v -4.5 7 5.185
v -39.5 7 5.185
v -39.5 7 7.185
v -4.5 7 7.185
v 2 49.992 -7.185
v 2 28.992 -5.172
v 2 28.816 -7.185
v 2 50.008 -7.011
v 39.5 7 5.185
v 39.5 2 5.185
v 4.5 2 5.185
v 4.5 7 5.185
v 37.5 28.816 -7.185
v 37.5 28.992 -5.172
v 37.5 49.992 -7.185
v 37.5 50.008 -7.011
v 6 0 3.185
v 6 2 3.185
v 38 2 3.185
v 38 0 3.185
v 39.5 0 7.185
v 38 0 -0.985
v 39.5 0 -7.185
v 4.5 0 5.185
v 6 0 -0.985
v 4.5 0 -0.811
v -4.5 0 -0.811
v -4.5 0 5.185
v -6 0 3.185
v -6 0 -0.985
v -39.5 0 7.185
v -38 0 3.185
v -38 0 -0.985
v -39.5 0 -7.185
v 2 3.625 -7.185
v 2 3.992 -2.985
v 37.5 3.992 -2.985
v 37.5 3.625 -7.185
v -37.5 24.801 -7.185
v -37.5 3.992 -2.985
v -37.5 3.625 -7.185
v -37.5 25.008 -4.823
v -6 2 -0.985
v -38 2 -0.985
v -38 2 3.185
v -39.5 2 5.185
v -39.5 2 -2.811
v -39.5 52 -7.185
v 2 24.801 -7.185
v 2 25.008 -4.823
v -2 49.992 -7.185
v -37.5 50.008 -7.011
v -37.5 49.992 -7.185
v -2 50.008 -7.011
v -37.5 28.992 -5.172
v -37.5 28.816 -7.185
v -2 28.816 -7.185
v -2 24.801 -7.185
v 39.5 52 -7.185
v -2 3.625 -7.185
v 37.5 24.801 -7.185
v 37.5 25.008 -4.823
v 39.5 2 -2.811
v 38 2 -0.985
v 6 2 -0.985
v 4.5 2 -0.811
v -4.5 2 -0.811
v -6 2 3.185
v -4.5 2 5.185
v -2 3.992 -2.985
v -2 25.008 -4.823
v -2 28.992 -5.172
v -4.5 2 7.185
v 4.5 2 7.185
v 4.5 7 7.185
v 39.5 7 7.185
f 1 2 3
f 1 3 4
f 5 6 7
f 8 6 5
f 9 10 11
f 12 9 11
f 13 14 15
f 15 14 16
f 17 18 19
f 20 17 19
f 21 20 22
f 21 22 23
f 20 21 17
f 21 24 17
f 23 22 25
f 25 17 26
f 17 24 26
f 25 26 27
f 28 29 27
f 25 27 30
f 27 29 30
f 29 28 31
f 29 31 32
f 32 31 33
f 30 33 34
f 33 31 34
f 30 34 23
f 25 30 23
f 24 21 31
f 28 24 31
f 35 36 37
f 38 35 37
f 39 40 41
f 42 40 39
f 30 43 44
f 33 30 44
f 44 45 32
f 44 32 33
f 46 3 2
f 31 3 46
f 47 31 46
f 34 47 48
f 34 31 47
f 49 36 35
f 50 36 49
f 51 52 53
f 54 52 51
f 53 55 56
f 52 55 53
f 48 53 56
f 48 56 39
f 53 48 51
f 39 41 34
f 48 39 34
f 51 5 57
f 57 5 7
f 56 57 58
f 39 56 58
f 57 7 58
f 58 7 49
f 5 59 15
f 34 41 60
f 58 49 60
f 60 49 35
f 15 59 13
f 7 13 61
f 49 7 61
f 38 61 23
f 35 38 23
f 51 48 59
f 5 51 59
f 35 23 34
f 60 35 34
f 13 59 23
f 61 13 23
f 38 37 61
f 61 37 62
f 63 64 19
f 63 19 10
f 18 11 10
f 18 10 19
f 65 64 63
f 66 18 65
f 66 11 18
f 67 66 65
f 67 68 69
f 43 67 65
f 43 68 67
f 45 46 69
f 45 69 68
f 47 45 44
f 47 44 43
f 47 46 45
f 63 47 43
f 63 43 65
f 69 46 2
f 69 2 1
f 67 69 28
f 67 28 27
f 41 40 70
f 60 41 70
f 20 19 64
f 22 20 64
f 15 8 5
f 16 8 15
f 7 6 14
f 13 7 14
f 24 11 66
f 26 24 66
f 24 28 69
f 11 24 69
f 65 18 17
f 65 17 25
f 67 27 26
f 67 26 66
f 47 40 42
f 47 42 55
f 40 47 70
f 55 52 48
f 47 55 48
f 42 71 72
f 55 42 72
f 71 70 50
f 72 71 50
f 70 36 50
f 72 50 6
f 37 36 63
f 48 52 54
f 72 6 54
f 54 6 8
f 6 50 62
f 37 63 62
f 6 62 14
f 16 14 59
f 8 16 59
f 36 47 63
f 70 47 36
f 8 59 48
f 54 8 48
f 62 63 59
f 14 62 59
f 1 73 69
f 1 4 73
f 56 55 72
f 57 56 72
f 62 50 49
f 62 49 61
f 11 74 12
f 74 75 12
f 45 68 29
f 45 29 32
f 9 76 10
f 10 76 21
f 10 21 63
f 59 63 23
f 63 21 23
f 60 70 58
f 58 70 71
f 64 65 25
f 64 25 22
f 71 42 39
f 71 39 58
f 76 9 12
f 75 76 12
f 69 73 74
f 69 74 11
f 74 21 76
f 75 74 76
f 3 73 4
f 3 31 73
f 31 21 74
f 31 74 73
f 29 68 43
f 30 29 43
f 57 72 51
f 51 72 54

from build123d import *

# Parameters (mm, degrees)
CROQUIS1_W              = 79
CROQUIS1_H              = 14.37
SALIENTE_EXTRUIR1_DEPTH = 2
SALIENTE_EXTRUIR2_DEPTH = 79
CROQUIS4_W              = 35
CROQUIS4_H              = 2
SALIENTE_EXTRUIR3_DEPTH = 5
CORTAR_EXTRUIR1_REACH   = 66.124
CROQUIS5_W              = 9
CROQUIS5_H              = 9.995566824
CORTAR_EXTRUIR2_REACH   = 68.213
CROQUIS6_W              = 35.5
CROQUIS6_H              = 21.095495938
CROQUIS6_H_2            = 21.095495939
CORTAR_EXTRUIR3_REACH   = 66.124
CROQUIS7_W              = 32
CROQUIS7_H              = 4.169878309
SALIENTE_EXTRUIR4_REACH = 70.495
CROQUIS8_W              = 2
CROQUIS8_H              = 2
SALIENTE_EXTRUIR5_REACH = 70.495
CROQUIS11_W             = 2
CROQUIS11_H             = 2


with BuildPart() as part:
    # Croquis1 → Saliente-Extruir1 (new body)
    with BuildSketch(Plane(origin=(0, 0, 0), x_dir=(1, 0, 0), z_dir=(0, 1, 0))):
        Rectangle(CROQUIS1_W, CROQUIS1_H)
    extrude(amount=SALIENTE_EXTRUIR1_DEPTH)

    # Croquis2 → Saliente-Extruir2 (add)
    with BuildSketch(Plane(origin=(39.5, 0, 0), x_dir=(0, 0, -1), z_dir=(1, 0, 0))):
        Polygon((2.810566824, 2), (7.185, 52), (7.185, 2), align=None)
    extrude(amount=-SALIENTE_EXTRUIR2_DEPTH)

    # Croquis4 → Saliente-Extruir3 (add)
    with BuildSketch(Plane(origin=(0, 2, 0), x_dir=(1, 0, 0), z_dir=(0, 1, 0))):
        with Locations((-22, -6.185)):
            Rectangle(CROQUIS4_W, CROQUIS4_H)
    saliente_extruir3 = extrude(amount=SALIENTE_EXTRUIR3_DEPTH)

    # Simetría1: Saliente-Extruir3 across plane
    add(saliente_extruir3.mirror(Plane(origin=(0, 0, 0), x_dir=(0, 0, 1), z_dir=(1, 0, 0))))

    # Croquis5 → Cortar-Extruir1 (cut, up to next)
    with BuildSketch(Plane(origin=(0, 2, 0), x_dir=(1, 0, 0), z_dir=(0, 1, 0)), mode=Mode.PRIVATE) as cortar_extruir1_sk1:
        with Locations((0, -2.187216588)):
            Rectangle(CROQUIS5_W, CROQUIS5_H)
    cortar_extruir1_tool1 = extrude(cortar_extruir1_sk1.sketch, amount=-CORTAR_EXTRUIR1_REACH, mode=Mode.PRIVATE) & part.part
    add(cortar_extruir1_tool1.solids().sort_by_distance((0, 2, 2.187217))[0], mode=Mode.SUBTRACT)

    # Cortar-Extruir2: up to this plane
    cortar_extruir2_end = Plane(origin=(39.5, 2, -7.185), z_dir=(0, 0, 1))
    # Croquis6 → Cortar-Extruir2 (cut, up to the surface)
    with BuildSketch(Plane(origin=(0, -0.228832657, -2.615569233), x_dir=(1, 0, 0), z_dir=(0, 0.0871557427476544, 0.996194698091746)), mode=Mode.PRIVATE) as cortar_extruir2_sk1:
        with Locations((-19.75, 39.880590343)):
            Rectangle(CROQUIS6_W, CROQUIS6_H)
    cortar_extruir2_tool1 = split(extrude(cortar_extruir2_sk1.sketch, amount=-CORTAR_EXTRUIR2_REACH, mode=Mode.PRIVATE), bisect_by=cortar_extruir2_end, keep=Keep.BOTH, mode=Mode.PRIVATE)
    add(cortar_extruir2_tool1.solids().sort_by_distance((-19.75, 39.5, -6.091392))[0], mode=Mode.SUBTRACT)
    # Croquis6 → Cortar-Extruir2 (cut, up to the surface)
    with BuildSketch(Plane(origin=(0, -0.228832657, -2.615569233), x_dir=(1, 0, 0), z_dir=(0, 0.0871557427476544, 0.996194698091746)), mode=Mode.PRIVATE) as cortar_extruir2_sk2:
        with Locations((19.75, 39.880590343)):
            Rectangle(CROQUIS6_W, CROQUIS6_H)
    cortar_extruir2_tool2 = split(extrude(cortar_extruir2_sk2.sketch, amount=-CORTAR_EXTRUIR2_REACH, mode=Mode.PRIVATE), bisect_by=cortar_extruir2_end, keep=Keep.BOTH, mode=Mode.PRIVATE)
    add(cortar_extruir2_tool2.solids().sort_by_distance((19.75, 39.5, -6.091392))[0], mode=Mode.SUBTRACT)
    # Croquis6 → Cortar-Extruir2 (cut, up to the surface)
    with BuildSketch(Plane(origin=(0, -0.228832657, -2.615569233), x_dir=(1, 0, 0), z_dir=(0, 0.0871557427476544, 0.996194698091746)), mode=Mode.PRIVATE) as cortar_extruir2_sk3:
        with Locations((19.75, 14.785094405)):
            Rectangle(CROQUIS6_W, CROQUIS6_H_2)
    cortar_extruir2_tool3 = split(extrude(cortar_extruir2_sk3.sketch, amount=-CORTAR_EXTRUIR2_REACH, mode=Mode.PRIVATE), bisect_by=cortar_extruir2_end, keep=Keep.BOTH, mode=Mode.PRIVATE)
    add(cortar_extruir2_tool3.solids().sort_by_distance((19.75, 14.5, -3.904175))[0], mode=Mode.SUBTRACT)
    # Croquis6 → Cortar-Extruir2 (cut, up to the surface)
    with BuildSketch(Plane(origin=(0, -0.228832657, -2.615569233), x_dir=(1, 0, 0), z_dir=(0, 0.0871557427476544, 0.996194698091746)), mode=Mode.PRIVATE) as cortar_extruir2_sk4:
        with Locations((-19.75, 14.785094405)):
            Rectangle(CROQUIS6_W, CROQUIS6_H_2)
    cortar_extruir2_tool4 = split(extrude(cortar_extruir2_sk4.sketch, amount=-CORTAR_EXTRUIR2_REACH, mode=Mode.PRIVATE), bisect_by=cortar_extruir2_end, keep=Keep.BOTH, mode=Mode.PRIVATE)
    add(cortar_extruir2_tool4.solids().sort_by_distance((-19.75, 14.5, -3.904175))[0], mode=Mode.SUBTRACT)

    # Croquis7 → Cortar-Extruir3 (cut, up to next)
    with BuildSketch(Plane(origin=(0, 2, 0), x_dir=(1, 0, 0), z_dir=(0, 1, 0)), mode=Mode.PRIVATE) as cortar_extruir3_sk1:
        with Locations((22, -1.100060846)):
            Rectangle(CROQUIS7_W, CROQUIS7_H)
    cortar_extruir3_tool1 = extrude(cortar_extruir3_sk1.sketch, amount=-CORTAR_EXTRUIR3_REACH, mode=Mode.PRIVATE) & part.part
    cortar_extruir3 = cortar_extruir3_tool1.solids().sort_by_distance((22, 2, 1.100061))[0]
    add(cortar_extruir3, mode=Mode.SUBTRACT)

    # Simetría4: Cortar-Extruir3 across plane
    add(cortar_extruir3.mirror(Plane(origin=(0, 0, 0), x_dir=(0, 0, 1), z_dir=(1, 0, 0))), mode=Mode.SUBTRACT)

    # Croquis8 → Saliente-Extruir4 (add, up to next)
    with BuildSketch(Plane(origin=(-4.5, 0, 0), x_dir=(0, 0, -1), z_dir=(1, 0, 0)), mode=Mode.PRIVATE) as saliente_extruir4_sk1:
        with Locations((-6.185, 1)):
            Rectangle(CROQUIS8_W, CROQUIS8_H)
    saliente_extruir4_tool1 = extrude(saliente_extruir4_sk1.sketch, amount=SALIENTE_EXTRUIR4_REACH, mode=Mode.PRIVATE) - part.part
    add(saliente_extruir4_tool1.solids().sort_by_distance((-4.5, 1, 6.185))[0])

    # Croquis11 → Saliente-Extruir5 (add, up to next)
    with BuildSketch(Plane(origin=(-4.5, 0, 0), x_dir=(0, 0, -1), z_dir=(1, 0, 0)), mode=Mode.PRIVATE) as saliente_extruir5_sk1:
        with Locations((1.810566824, 1)):
            Rectangle(CROQUIS11_W, CROQUIS11_H)
    saliente_extruir5_tool1 = extrude(saliente_extruir5_sk1.sketch, amount=SALIENTE_EXTRUIR5_REACH, mode=Mode.PRIVATE) - part.part
    add(saliente_extruir5_tool1.solids().sort_by_distance((-4.5, 1, -1.810567))[0])


solid = part.part
